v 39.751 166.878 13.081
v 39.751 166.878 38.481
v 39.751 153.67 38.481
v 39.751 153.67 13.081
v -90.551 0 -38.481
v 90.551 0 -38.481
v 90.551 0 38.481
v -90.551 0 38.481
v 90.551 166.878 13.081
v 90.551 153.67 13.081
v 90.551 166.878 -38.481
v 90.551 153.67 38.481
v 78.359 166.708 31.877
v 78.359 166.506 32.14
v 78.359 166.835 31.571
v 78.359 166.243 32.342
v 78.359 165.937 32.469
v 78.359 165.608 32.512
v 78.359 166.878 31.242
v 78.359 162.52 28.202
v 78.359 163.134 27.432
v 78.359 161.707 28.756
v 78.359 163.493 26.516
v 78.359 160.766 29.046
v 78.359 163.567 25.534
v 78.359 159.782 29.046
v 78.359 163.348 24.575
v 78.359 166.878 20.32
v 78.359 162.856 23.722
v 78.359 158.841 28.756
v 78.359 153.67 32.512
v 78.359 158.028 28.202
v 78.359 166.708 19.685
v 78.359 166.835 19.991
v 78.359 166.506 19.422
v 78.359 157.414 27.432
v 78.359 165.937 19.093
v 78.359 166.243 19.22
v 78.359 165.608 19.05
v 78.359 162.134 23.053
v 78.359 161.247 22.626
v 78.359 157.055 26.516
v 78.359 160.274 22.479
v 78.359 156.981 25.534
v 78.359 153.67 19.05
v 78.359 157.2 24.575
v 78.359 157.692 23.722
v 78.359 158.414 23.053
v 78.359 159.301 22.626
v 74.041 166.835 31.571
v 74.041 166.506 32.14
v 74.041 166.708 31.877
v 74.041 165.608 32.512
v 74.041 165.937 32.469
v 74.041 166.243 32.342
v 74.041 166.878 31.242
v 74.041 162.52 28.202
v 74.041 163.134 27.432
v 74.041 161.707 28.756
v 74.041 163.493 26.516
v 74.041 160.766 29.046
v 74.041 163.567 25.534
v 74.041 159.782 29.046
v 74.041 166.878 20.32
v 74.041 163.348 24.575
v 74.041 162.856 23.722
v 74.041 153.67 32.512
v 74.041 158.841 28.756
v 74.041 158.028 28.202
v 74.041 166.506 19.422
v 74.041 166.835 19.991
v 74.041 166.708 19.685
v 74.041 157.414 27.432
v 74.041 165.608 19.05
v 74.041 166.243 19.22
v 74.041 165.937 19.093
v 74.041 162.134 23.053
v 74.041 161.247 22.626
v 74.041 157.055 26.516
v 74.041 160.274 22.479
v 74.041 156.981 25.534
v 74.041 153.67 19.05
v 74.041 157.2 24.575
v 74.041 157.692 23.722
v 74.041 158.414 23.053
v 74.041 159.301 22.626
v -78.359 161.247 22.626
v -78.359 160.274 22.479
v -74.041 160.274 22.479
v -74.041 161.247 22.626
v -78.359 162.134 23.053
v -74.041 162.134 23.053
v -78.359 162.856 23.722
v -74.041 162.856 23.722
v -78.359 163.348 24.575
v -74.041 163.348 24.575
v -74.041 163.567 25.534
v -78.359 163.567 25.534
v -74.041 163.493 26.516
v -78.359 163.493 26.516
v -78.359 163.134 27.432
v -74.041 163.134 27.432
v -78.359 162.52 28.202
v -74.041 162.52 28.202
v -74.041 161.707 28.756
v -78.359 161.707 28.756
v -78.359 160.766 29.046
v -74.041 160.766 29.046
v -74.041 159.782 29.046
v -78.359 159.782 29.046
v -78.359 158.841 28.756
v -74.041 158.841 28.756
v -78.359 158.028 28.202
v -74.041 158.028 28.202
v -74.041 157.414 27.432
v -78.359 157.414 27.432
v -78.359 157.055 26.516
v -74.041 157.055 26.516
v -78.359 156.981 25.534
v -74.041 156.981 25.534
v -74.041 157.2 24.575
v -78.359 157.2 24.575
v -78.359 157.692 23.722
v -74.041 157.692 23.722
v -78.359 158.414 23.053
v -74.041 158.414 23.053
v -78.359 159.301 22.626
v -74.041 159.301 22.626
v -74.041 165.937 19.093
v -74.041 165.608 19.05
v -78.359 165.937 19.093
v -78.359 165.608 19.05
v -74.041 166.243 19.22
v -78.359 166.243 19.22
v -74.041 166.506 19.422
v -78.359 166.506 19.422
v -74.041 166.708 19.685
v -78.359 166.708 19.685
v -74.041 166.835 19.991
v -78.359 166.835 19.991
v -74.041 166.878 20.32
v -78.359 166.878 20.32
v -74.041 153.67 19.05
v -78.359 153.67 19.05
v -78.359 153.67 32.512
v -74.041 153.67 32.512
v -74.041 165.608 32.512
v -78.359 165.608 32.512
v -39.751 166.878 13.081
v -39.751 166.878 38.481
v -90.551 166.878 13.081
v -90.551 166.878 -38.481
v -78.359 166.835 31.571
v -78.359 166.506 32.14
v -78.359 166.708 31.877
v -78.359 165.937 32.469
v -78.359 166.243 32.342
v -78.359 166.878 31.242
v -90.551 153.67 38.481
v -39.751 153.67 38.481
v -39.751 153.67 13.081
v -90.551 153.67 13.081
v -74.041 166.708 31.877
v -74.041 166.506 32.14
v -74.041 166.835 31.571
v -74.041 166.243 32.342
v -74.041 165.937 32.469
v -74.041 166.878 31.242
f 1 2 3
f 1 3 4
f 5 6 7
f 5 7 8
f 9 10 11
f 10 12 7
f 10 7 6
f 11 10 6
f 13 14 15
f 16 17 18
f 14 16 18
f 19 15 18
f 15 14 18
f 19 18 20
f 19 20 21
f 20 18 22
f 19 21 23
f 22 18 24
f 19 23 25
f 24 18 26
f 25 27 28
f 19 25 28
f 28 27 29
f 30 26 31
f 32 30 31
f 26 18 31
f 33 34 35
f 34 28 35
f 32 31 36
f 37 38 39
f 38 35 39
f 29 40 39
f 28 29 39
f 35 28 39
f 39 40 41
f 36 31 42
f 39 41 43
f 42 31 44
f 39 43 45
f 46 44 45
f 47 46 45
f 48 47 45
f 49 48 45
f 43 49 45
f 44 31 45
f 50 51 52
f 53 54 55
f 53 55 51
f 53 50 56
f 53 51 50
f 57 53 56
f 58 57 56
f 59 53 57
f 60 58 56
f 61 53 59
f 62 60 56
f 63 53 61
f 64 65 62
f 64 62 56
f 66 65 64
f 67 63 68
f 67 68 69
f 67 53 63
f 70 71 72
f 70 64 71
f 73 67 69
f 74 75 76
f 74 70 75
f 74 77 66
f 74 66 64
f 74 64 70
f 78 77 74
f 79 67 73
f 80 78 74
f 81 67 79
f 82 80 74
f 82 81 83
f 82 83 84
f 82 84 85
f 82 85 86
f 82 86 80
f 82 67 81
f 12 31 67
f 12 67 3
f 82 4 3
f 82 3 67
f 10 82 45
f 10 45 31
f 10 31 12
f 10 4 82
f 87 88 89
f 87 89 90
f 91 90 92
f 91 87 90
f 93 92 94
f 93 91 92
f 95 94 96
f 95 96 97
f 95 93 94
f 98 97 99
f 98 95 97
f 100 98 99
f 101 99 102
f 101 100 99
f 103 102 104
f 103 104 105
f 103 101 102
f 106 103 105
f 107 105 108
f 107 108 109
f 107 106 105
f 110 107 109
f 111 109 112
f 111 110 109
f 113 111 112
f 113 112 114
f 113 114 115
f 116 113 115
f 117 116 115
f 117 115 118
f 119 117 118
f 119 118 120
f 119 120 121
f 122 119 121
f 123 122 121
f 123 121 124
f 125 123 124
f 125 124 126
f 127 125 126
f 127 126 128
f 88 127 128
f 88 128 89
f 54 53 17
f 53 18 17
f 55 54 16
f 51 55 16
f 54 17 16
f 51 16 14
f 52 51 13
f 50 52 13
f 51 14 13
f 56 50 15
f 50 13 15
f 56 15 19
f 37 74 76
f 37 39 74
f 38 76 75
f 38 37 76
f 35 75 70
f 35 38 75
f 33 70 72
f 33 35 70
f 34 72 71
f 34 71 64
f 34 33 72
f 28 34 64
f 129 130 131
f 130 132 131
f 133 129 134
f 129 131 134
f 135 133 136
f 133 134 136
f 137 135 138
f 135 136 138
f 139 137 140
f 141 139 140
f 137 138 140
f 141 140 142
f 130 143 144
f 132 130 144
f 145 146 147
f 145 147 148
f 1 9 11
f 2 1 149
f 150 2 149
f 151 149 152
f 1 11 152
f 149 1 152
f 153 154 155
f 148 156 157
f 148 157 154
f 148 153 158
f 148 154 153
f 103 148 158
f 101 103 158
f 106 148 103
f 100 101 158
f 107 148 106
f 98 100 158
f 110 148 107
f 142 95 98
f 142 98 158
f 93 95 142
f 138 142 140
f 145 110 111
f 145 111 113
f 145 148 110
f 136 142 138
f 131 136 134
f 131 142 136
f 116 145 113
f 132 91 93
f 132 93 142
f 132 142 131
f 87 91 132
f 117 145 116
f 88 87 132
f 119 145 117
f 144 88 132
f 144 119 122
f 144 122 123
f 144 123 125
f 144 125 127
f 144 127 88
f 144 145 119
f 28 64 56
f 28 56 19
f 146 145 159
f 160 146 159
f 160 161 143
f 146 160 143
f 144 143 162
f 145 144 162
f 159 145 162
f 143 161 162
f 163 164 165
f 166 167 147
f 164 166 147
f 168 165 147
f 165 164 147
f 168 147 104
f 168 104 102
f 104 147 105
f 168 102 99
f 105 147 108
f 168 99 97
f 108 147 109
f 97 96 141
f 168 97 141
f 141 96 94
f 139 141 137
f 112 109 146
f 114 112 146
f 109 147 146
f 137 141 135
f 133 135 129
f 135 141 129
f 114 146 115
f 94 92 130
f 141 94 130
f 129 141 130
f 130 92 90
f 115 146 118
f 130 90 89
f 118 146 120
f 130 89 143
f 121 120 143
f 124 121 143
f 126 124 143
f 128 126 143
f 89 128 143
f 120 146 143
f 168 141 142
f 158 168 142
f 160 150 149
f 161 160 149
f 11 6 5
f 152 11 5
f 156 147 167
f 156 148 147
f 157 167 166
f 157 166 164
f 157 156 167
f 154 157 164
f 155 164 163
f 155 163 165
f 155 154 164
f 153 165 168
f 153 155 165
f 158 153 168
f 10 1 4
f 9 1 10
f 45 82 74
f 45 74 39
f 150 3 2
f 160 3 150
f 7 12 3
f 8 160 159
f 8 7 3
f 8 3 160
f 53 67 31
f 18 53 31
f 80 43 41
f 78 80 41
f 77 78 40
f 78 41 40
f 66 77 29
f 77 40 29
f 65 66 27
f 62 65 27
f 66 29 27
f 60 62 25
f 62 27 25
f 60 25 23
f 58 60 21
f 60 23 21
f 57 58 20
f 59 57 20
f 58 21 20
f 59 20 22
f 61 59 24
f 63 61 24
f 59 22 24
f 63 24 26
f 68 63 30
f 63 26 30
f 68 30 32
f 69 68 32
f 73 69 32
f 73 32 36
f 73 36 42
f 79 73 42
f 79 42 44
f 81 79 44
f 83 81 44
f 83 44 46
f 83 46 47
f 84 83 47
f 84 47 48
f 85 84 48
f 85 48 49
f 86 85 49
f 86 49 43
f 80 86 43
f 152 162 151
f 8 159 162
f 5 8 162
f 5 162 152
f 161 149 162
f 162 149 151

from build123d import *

# Parameters (mm, degrees)
SKETCH2_W           = 181.102
SKETCH2_H           = 76.962
BOSS_EXTRUDE1_DEPTH = 166.878
CUT_EXTRUDE1_DEPTH  = 194.722837699
SKETCH4_3_W         = 50.8
SKETCH4_3_H         = 25.4
CUT_EXTRUDE2_DEPTH  = 13.208
SKETCH5_W           = 4.318
SKETCH5_H           = 13.462
BOSS_EXTRUDE2_DEPTH = 13.208
SKETCH6_R           = 3.302
CUT_EXTRUDE3_DEPTH  = 13.208
FILLET1_R           = 1.27


with BuildPart() as part:
    # Sketch2 → Boss-Extrude1 (new body)
    with BuildSketch(Plane(origin=(0, 0, 0), x_dir=(1, 0, 0), z_dir=(0, 1, 0))):
        Rectangle(SKETCH2_W, SKETCH2_H)
    extrude(amount=BOSS_EXTRUDE1_DEPTH)

    # Sketch4 → Cut-Extrude1 (cut, through all)
    with BuildSketch(Plane(origin=(0, 166.878, 0), x_dir=(1, 0, 0), z_dir=(0, 1, 0))):
        Polygon((0, -38.481), (0, 0), (0, 38.481), (-90.551, 38.481), (-90.551, -38.481), align=None)
    extrude(amount=-CUT_EXTRUDE1_DEPTH, mode=Mode.SUBTRACT)

    # Sketch4<3> → Cut-Extrude2 (cut)
    with BuildSketch(Plane(origin=(0, 166.878, 0), x_dir=(1, 0, 0), z_dir=(0, 1, 0))):
        with Locations((65.151, -25.781)):
            Rectangle(SKETCH4_3_W, SKETCH4_3_H)
    extrude(amount=-CUT_EXTRUDE2_DEPTH, mode=Mode.SUBTRACT)

    # Sketch5 → Boss-Extrude2 (add)
    with BuildSketch(Plane(origin=(0, 153.67, 0), x_dir=(1, 0, 0), z_dir=(0, 1, 0))):
        with Locations((76.2, -25.781)):
            Rectangle(SKETCH5_W, SKETCH5_H)
    extrude(amount=BOSS_EXTRUDE2_DEPTH)

    # Sketch6 → Cut-Extrude3 (cut)
    with BuildSketch(Plane(origin=(78.359, 0, 0), x_dir=(0, 0, -1), z_dir=(1, 0, 0))):
        with Locations((-25.781, 160.274)):
            Circle(SKETCH6_R)
    extrude(amount=-CUT_EXTRUDE3_DEPTH, mode=Mode.SUBTRACT)

    # Fillet1
    fillet1_edges = [part.edges().sort_by_distance(p)[0] for p in [
        (76.2, 166.878, 32.512),
        (76.2, 166.878, 19.05),
    ]]
    fillet(fillet1_edges, radius=FILLET1_R)

    # Mirror1: part across plane


with BuildPart() as part_1:
    add(part.part)
    add(part.part.mirror(Plane.ZY))


solid = part_1.part
